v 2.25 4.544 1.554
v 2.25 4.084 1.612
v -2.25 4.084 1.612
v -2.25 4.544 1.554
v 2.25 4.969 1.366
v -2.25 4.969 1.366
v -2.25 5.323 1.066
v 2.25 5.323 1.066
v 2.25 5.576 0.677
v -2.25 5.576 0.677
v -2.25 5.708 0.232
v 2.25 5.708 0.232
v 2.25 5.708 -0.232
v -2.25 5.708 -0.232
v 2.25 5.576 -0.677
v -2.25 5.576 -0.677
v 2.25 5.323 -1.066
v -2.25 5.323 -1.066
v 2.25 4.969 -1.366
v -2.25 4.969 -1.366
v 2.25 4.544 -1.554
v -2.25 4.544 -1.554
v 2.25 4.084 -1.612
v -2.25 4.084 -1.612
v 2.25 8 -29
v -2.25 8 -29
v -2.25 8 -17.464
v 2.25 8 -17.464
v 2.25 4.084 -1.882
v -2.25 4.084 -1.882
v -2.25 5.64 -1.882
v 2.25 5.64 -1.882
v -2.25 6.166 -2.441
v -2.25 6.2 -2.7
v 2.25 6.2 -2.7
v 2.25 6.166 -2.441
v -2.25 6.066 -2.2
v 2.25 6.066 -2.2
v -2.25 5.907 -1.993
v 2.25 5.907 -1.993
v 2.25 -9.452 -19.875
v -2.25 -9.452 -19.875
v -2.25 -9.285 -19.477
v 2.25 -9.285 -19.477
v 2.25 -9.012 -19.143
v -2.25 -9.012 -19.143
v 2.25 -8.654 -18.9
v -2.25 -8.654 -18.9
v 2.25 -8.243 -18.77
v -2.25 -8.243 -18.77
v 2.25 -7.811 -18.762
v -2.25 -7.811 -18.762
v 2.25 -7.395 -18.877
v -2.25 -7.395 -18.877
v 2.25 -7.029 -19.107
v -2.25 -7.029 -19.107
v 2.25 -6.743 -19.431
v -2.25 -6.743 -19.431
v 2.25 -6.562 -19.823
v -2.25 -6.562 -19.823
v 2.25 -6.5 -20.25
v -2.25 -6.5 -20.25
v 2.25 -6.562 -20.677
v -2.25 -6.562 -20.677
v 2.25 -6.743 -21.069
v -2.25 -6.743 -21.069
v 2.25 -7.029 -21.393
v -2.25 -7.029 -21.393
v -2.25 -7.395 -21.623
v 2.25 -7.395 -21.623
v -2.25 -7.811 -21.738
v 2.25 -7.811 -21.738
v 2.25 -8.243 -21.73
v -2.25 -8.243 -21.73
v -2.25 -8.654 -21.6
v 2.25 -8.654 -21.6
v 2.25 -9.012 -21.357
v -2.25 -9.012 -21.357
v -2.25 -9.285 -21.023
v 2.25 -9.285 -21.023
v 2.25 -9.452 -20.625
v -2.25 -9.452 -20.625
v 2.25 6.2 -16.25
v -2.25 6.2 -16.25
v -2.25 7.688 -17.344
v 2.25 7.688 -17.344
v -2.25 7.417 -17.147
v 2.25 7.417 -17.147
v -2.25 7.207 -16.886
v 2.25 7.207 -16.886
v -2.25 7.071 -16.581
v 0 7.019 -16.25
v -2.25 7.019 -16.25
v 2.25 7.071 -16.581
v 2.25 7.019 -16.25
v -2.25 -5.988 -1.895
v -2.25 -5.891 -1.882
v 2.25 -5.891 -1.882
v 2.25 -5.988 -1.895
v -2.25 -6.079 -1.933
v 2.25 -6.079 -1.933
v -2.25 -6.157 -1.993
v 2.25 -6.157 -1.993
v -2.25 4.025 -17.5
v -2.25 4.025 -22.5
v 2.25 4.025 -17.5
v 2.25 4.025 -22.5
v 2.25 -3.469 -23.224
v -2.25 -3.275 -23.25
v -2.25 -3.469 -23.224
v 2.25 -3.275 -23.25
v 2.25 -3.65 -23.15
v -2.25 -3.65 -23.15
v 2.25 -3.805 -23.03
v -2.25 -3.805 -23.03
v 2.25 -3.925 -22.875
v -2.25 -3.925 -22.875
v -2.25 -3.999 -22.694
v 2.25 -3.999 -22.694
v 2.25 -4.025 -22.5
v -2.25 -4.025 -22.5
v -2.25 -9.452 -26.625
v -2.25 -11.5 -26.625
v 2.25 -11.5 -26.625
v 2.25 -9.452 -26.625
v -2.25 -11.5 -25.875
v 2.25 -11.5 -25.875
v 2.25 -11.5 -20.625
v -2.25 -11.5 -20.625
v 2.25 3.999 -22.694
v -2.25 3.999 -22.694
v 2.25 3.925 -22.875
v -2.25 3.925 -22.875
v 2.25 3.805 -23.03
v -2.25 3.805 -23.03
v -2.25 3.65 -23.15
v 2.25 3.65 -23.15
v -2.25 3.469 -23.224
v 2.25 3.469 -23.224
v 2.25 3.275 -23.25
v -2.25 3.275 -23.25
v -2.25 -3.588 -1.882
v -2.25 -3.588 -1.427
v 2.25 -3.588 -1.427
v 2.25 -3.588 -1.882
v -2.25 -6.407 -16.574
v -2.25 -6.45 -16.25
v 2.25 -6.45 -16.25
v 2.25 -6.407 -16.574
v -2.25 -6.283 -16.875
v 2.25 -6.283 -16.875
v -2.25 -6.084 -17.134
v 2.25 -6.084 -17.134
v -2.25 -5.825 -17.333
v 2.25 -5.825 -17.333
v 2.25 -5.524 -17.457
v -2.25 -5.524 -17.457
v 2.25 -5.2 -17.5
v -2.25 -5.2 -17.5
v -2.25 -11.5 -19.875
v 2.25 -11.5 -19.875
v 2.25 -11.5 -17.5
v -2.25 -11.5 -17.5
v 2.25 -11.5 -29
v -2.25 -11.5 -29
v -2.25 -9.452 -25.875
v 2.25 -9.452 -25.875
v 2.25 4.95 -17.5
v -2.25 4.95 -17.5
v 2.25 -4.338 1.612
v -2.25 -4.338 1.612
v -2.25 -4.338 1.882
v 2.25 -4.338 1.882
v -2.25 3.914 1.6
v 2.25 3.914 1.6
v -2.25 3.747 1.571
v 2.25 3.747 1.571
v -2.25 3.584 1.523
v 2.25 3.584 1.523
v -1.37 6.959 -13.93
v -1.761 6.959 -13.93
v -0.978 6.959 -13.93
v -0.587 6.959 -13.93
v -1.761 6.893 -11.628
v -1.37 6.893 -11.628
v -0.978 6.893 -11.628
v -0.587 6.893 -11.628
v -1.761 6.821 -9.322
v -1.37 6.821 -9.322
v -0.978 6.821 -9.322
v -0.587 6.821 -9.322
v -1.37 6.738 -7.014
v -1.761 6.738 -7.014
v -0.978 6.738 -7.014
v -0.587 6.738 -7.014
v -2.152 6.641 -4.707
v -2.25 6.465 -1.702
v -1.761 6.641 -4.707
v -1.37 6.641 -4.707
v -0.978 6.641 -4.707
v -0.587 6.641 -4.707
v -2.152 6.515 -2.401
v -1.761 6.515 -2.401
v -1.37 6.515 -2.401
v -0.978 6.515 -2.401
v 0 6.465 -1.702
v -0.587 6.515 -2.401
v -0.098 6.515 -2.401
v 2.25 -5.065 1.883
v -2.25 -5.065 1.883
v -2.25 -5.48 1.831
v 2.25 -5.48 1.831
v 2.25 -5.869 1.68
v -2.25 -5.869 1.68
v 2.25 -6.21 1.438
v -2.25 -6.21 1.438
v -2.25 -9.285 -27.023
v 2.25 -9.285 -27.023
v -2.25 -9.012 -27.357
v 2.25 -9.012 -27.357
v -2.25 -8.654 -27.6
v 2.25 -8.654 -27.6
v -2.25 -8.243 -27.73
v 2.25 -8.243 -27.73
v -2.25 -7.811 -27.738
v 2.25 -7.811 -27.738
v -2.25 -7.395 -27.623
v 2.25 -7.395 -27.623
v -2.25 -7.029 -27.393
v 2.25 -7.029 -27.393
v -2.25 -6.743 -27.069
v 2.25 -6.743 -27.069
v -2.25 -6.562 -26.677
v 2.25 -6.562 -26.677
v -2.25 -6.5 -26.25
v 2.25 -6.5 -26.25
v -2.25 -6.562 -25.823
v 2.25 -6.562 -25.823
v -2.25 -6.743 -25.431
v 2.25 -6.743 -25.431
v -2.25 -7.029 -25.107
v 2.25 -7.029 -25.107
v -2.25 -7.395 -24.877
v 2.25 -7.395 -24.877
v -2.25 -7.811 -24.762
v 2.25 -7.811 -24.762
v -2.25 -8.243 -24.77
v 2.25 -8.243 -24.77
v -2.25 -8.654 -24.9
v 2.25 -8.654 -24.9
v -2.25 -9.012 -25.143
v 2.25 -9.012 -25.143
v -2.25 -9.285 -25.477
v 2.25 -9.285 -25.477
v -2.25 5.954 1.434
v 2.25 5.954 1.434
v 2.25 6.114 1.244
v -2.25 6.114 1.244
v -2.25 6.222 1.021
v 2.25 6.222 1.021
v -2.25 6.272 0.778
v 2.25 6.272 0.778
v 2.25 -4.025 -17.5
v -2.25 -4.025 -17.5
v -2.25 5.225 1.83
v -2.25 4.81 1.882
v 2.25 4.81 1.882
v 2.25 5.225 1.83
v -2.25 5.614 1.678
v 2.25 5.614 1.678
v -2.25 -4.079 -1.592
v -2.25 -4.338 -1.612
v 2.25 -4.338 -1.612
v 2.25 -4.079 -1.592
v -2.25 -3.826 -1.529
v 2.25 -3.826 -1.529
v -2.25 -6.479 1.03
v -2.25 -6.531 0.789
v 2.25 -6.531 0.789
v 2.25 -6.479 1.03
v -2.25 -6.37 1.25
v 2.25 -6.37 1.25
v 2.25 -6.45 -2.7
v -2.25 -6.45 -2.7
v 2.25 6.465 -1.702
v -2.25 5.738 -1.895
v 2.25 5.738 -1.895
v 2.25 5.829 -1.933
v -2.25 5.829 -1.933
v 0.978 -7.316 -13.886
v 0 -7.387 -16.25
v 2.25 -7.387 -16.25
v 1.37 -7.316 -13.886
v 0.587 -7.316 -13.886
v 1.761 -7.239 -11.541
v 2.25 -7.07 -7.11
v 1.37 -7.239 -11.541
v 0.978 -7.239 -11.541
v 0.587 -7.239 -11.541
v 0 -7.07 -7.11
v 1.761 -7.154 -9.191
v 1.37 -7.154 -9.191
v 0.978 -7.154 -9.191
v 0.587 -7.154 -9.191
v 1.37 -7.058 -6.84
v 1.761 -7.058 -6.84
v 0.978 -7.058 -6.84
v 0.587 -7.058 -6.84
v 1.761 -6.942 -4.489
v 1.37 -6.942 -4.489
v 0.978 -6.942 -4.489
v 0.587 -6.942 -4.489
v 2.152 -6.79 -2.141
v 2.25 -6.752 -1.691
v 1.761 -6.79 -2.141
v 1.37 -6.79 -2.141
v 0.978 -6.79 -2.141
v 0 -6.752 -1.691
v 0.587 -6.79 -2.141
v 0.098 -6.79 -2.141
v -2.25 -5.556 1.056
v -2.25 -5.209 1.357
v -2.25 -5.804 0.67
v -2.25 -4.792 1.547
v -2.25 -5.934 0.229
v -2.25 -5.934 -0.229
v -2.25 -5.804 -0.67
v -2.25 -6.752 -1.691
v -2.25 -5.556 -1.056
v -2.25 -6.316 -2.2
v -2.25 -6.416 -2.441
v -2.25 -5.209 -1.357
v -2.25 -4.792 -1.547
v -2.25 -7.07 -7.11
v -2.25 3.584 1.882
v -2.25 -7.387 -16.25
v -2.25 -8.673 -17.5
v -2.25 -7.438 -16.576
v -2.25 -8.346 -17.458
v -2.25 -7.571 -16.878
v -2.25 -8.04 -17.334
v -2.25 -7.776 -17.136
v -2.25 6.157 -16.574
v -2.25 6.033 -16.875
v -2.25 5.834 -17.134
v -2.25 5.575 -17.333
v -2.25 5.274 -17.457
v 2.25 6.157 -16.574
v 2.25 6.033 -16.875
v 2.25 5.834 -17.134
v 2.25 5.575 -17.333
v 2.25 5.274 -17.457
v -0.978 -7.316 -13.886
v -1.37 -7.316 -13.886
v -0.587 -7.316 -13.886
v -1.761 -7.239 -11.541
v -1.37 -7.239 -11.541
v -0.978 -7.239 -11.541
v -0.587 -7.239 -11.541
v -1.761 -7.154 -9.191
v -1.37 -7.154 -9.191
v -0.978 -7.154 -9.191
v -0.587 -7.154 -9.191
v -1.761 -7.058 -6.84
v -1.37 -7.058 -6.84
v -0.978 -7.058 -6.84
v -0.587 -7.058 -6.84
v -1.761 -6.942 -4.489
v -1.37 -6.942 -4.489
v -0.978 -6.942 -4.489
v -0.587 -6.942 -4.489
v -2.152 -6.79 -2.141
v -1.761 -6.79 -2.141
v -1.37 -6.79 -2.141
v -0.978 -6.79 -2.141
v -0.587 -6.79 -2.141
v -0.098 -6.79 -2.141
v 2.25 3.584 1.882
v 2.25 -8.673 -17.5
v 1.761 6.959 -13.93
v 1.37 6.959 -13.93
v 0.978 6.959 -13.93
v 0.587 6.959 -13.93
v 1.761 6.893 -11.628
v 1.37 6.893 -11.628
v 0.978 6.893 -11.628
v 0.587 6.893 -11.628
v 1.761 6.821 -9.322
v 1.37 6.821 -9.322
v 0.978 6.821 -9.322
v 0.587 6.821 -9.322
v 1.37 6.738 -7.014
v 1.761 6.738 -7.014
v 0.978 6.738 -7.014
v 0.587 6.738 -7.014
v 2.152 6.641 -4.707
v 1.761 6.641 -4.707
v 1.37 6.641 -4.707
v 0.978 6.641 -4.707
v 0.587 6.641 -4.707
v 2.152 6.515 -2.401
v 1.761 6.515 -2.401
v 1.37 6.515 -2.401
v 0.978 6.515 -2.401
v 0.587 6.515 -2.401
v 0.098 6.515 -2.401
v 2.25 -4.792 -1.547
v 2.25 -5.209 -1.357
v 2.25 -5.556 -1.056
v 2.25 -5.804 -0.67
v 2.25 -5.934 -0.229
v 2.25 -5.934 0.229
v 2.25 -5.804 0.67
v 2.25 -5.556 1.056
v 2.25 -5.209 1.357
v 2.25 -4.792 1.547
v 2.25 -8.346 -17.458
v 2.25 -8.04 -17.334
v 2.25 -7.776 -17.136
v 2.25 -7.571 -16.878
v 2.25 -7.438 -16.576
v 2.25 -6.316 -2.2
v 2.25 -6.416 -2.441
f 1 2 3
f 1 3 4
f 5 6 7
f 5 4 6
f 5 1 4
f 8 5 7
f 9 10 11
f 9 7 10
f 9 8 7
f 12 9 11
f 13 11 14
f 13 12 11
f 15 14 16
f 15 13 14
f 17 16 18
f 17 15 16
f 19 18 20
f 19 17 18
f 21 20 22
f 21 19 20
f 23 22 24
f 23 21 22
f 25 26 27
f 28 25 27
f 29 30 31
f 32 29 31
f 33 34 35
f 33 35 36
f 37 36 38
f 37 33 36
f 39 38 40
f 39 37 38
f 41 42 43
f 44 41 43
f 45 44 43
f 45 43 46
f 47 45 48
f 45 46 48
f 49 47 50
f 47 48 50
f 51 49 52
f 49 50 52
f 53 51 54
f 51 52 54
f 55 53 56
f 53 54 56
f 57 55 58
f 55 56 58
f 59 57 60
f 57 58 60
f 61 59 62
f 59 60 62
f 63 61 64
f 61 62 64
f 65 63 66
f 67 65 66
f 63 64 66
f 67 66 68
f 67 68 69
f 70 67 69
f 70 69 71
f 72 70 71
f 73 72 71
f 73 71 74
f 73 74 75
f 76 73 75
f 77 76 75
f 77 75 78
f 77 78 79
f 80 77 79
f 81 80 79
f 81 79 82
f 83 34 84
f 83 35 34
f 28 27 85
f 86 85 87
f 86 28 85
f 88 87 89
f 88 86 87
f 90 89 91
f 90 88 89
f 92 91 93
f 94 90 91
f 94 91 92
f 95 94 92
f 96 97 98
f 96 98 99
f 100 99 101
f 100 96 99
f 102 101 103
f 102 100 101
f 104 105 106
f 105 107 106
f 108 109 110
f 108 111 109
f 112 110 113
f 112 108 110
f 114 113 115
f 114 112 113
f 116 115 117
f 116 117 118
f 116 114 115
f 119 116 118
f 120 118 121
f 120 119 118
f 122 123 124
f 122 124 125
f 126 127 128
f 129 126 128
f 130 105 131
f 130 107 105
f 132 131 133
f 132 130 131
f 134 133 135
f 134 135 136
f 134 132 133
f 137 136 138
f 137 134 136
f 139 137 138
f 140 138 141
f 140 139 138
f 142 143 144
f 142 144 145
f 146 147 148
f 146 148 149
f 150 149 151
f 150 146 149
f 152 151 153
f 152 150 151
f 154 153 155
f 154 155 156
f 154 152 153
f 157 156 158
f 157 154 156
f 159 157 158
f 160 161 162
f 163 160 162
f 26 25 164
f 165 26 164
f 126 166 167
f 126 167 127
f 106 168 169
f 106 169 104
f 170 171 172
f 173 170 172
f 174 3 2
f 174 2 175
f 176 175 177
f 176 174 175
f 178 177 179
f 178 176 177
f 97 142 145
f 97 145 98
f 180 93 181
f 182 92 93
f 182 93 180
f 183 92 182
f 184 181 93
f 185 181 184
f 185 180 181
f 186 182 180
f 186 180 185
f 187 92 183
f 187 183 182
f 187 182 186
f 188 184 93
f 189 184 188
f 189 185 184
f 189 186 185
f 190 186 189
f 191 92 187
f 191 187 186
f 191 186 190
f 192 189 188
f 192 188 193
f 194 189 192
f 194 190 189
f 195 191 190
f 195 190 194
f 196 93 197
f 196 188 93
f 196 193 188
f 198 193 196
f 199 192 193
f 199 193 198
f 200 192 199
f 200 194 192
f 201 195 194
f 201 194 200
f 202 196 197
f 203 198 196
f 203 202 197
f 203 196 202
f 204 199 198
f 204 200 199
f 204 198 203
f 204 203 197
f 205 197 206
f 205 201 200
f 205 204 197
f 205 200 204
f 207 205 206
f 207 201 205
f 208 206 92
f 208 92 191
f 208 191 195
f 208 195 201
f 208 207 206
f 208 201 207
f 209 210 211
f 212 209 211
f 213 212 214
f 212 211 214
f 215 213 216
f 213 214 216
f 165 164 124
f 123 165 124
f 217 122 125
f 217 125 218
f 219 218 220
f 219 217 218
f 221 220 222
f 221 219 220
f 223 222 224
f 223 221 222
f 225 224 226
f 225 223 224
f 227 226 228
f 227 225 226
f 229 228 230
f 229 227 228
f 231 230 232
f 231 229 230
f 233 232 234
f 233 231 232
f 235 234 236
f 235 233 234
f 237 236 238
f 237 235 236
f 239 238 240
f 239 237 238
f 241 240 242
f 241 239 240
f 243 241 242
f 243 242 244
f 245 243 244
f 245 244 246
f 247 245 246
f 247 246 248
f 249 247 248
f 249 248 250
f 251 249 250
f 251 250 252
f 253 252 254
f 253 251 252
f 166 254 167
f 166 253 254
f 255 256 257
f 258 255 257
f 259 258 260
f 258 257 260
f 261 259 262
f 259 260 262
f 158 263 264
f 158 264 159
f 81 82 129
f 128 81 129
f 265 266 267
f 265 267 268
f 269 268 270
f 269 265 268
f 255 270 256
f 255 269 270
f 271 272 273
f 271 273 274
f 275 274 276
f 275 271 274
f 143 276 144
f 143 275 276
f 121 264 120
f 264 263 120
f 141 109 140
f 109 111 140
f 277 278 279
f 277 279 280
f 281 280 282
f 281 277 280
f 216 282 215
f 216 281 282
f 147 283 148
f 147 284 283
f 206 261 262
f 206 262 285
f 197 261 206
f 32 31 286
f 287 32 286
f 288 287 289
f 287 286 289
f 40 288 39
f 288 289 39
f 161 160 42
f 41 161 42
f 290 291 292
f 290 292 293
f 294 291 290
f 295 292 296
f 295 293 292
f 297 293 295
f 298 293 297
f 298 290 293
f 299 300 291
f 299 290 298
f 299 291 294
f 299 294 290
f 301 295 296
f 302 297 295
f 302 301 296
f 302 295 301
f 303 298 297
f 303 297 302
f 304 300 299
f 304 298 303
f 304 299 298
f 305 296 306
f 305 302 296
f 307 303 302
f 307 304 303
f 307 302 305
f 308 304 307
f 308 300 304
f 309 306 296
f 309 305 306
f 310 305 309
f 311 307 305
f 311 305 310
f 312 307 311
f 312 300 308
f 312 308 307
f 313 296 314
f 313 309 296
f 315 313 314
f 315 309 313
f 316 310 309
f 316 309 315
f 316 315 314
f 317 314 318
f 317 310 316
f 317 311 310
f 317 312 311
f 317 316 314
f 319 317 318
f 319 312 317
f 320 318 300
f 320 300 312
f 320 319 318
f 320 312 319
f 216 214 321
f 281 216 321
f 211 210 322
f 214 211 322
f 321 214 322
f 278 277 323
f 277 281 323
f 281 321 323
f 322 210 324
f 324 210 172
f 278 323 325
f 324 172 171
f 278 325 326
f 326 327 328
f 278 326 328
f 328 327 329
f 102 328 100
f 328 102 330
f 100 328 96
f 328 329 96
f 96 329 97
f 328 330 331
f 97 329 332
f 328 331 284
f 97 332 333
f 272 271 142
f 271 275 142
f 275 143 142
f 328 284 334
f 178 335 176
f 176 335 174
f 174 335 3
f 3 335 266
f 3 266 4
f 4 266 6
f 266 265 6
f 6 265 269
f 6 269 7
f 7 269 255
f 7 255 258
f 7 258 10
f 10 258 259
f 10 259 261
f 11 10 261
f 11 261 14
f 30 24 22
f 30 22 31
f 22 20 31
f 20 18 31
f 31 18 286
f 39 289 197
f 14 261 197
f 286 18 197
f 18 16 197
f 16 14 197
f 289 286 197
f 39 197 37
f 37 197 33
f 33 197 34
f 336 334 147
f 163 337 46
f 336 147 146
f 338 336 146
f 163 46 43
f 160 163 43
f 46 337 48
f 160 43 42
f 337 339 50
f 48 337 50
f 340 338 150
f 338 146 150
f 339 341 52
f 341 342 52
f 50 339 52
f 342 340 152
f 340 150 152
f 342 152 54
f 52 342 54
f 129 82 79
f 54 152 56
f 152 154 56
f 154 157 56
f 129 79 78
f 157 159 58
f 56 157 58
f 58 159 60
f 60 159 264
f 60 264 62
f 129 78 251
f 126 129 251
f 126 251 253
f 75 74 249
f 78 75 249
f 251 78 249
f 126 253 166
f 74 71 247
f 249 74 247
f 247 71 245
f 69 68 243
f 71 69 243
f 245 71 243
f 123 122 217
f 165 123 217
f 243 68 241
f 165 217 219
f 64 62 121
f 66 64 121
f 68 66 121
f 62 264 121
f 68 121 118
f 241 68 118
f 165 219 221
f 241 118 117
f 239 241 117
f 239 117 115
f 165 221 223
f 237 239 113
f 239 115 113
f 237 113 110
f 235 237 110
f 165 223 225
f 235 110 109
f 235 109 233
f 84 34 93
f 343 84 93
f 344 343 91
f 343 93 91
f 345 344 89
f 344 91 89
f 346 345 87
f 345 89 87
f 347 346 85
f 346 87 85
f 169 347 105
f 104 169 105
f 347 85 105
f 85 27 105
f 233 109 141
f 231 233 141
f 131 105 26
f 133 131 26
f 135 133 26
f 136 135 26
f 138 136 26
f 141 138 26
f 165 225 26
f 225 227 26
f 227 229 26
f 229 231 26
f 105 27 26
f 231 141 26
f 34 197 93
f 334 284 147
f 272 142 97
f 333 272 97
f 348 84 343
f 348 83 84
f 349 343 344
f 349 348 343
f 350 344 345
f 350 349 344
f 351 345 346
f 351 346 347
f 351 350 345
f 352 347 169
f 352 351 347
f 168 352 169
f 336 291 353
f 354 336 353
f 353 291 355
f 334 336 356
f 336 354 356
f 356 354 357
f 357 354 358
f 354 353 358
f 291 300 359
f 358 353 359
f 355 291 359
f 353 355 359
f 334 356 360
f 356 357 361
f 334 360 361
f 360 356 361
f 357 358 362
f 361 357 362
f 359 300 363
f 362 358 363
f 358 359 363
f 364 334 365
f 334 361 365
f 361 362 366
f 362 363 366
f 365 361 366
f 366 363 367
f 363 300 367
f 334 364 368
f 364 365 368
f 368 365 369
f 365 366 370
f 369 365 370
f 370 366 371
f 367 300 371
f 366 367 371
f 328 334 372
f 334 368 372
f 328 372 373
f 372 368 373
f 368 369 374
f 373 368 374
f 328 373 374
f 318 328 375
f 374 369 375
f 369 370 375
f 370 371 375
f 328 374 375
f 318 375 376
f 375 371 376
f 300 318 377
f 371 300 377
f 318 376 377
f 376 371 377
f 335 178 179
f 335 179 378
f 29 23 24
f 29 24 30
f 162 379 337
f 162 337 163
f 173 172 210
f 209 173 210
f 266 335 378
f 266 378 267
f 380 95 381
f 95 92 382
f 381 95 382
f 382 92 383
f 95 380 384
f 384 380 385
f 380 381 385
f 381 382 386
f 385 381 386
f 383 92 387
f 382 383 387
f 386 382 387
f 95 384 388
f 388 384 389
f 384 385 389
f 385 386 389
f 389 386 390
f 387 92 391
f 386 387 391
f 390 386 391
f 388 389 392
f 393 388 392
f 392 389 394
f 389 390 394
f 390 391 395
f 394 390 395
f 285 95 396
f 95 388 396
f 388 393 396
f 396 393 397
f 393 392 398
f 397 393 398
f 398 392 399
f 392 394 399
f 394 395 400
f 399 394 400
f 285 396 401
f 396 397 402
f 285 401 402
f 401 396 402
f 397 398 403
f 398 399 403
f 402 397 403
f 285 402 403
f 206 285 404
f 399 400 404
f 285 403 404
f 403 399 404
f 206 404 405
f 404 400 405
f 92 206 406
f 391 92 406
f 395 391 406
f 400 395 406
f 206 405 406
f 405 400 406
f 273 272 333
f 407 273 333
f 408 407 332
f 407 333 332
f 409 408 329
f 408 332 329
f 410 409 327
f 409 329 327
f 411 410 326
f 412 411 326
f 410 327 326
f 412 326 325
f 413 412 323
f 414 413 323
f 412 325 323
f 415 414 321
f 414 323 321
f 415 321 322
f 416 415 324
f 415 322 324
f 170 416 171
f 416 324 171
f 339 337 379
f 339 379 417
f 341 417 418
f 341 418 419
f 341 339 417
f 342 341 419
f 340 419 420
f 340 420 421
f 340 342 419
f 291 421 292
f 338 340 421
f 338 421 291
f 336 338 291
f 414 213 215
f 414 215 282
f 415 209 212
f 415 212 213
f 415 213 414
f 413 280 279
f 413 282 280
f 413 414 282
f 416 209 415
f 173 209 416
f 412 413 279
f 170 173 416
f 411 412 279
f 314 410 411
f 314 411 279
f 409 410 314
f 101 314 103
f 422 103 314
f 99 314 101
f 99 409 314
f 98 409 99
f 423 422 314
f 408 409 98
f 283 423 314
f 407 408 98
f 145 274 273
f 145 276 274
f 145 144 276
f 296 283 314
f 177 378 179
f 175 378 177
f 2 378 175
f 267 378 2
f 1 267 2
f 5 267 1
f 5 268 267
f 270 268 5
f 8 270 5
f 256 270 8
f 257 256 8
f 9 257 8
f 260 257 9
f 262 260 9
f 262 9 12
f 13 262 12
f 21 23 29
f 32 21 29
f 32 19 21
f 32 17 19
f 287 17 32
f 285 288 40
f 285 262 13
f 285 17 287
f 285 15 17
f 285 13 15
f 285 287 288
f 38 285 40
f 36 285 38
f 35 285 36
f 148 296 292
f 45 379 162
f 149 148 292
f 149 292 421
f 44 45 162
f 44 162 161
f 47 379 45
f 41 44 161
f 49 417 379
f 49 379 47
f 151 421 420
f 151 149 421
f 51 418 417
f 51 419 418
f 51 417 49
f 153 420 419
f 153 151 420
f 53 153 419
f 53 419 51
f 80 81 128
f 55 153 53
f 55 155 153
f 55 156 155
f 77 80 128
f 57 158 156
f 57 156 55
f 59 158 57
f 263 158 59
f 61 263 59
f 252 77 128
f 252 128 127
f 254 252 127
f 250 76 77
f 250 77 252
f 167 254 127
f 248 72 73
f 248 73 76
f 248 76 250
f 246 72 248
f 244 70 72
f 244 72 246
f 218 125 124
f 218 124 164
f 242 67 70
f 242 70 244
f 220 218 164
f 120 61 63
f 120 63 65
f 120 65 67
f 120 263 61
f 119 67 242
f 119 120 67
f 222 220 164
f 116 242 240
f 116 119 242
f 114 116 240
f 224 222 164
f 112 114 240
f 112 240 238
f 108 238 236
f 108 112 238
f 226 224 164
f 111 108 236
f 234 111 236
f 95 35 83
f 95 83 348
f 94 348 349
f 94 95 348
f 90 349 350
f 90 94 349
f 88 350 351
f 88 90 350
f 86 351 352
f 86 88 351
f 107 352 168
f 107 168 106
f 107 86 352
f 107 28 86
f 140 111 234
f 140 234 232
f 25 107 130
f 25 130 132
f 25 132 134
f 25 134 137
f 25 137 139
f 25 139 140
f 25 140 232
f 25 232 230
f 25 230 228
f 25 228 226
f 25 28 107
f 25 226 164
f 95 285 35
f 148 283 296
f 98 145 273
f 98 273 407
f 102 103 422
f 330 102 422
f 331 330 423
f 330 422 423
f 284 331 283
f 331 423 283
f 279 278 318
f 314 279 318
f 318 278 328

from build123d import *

# Parameters (mm, degrees)
BOSS_EXTRUDE1_DEPTH = 2.25
CUT_EXTRUDE1_DEPTH  = 32.519835025
FILLET1_R           = 0.75
BOSS_EXTRUDE2_DEPTH = 2.25
BOSS_EXTRUDE4_DEPTH = 4.5
FILLET2_R           = 1
CUT_EXTRUDE4_DEPTH  = 5
BOSS_EXTRUDE5_START = -2.25
BOSS_EXTRUDE5_DEPTH = 4.5
SKETCH12_W          = 11.535913892
SKETCH12_H          = 0.5
CUT_EXTRUDE5_DEPTH  = 32.519835168


with BuildPart() as part:
    # Sketch1 → Boss-Extrude1 (new, symmetric)
    with BuildSketch(Plane(origin=(0, 0, 0), x_dir=(0, 0, -1), z_dir=(1, 0, 0))):
        Polygon((17.5, 4.025), (17.5, 4.95), (17.5, 8.301357795), (17.5, 8.5), (29, 8.5), (29, -11.5), (17.5, -11.5), (17.5, -8.673247977), (17.5, -5.2), (17.5, -4.025), (23.25, -4.025), (23.25, 4.025), align=None)
    extrude(amount=BOSS_EXTRUDE1_DEPTH, both=True)

    # Sketch4 → Cut-Extrude1 (cut, through all)
    with BuildSketch(Plane.ZY.offset(2.25)):
        with BuildLine():
            Line((-26.625, -11.5), (-26.625, -9.452368755))
            ThreePointArc((-26.625, -9.452368755), (-26.25, -6.5), (-25.875, -9.452368755))
            Line((-25.875, -9.452368755), (-25.875, -11.5))
            Line((-25.875, -11.5), (-26.625, -11.5))
        make_face()
        with BuildLine():
            Line((-20.625, -9.452368755), (-20.625, -11.5))
            Line((-20.625, -11.5), (-19.875, -11.5))
            Line((-19.875, -11.5), (-19.875, -9.452368755))
            ThreePointArc((-19.875, -9.452368755), (-20.25, -6.5), (-20.625, -9.452368755))
        make_face()
    extrude(amount=-CUT_EXTRUDE1_DEPTH, mode=Mode.SUBTRACT)

    # Fillet1
    fillet1_edges = [part.edges().sort_by_distance(p)[0] for p in [
        (0, -4.025, -23.25),
        (0, 4.025, -23.25),
    ]]
    fillet(fillet1_edges, radius=FILLET1_R)

    # Sketch2 → Boss-Extrude2 (add, symmetric)
    with BuildSketch(Plane(origin=(0, 0, 0), x_dir=(0, 0, -1), z_dir=(1, 0, 0))):
        with BuildLine():
            Line((1.7, -6.45), (16.25, -6.45))
            ThreePointArc((16.25, -6.45), (17.133883476, -6.083883476), (17.5, -5.2))
            Line((17.5, -5.2), (17.5, -8.673247977))
            ThreePointArc((17.5, -8.673247977), (17.136039688, -7.776350438), (16.25, -7.38670191))
            add(Edge.make_bspline(
                [(16.25, -7.38670191), (15.982544989, -7.378993429), (15.453928293, -7.363553213), (14.397933299, -7.332164796), (13.361703255, -7.29957206), (12.100876768, -7.258861503), (10.975898138, -7.220164867), (9.768608213, -7.176905715), (8.611498431, -7.132461764), (7.424019565, -7.084024767), (6.255327605, -7.032148986), (5.075409432, -6.975000615), (3.903033551, -6.911058587), (2.727587922, -6.837381628), (1.722719604, -6.759660724), (0.954287884, -6.683217964), (0.456400256, -6.610639739), (0.237084283, -6.56505431), (0.137087499, -6.537027737), (0.087321771, -6.519206998), (0.060111975, -6.507310883), (0.043000809, -6.498417374), (0.030678751, -6.490921905), (0.01600081, -6.480451435), (0.005229873, -6.469720378), (0.000815287, -6.459042222), (0, -6.45)],
                knots=[0.090617463, 0.090617463, 0.090617463, 0.090617463, 0.090617463, 0.156221583, 0.221825702, 0.287429821, 0.35303394, 0.41863806, 0.484242179, 0.549846298, 0.615450417, 0.681054537, 0.746658656, 0.812262775, 0.877866892, 0.943220604, 0.971682344, 0.984222879, 0.990100446, 0.993094331, 0.994839978, 0.995992112, 0.996718592, 0.997392575, 0.998059613, 1, 1, 1, 1, 1], degree=4))
            Line((0, -6.45), (-1.7, -6.45))
            Line((-1.7, -6.45), (-1.7, -4.45))
            ThreePointArc((-1.7, -4.45), (0, -2.75), (1.7, -4.45))
            Line((1.7, -4.45), (1.7, -6.45))
        make_face()
        with BuildLine():
            Line((17.5, 4.95), (17.5, 8.301357795))
            ThreePointArc((17.5, 8.301357795), (17.135773003, 7.406119792), (16.25, 7.019443472))
            add(Edge.make_bspline(
                [(16.25, 7.019443472), (15.987531738, 7.01282569), (15.470119802, 6.999607493), (14.430987801, 6.972604073), (13.4161389, 6.944724509), (12.177418763, 6.909818433), (11.074067802, 6.876745116), (9.888671574, 6.839769393), (8.753245319, 6.801895235), (7.587539532, 6.760659557), (6.440473735, 6.716696676), (5.282208442, 6.668364938), (4.131254265, 6.614778963), (2.976099529, 6.553298089), (1.935166314, 6.486657721), (1.112090632, 6.419330464), (0.550531612, 6.355136747), (0.26288649, 6.306396396), (0.144856484, 6.278329018), (0.090076692, 6.261554801), (0.061106748, 6.250555216), (0.043474041, 6.242594857), (0.030984848, 6.235965644), (0.016604026, 6.227042793), (0.005627844, 6.21781856), (0.000998515, 6.208209958), (0, 6.2)],
                knots=[0.090678734, 0.090678734, 0.090678734, 0.090678734, 0.090678734, 0.15510723, 0.219535726, 0.283964222, 0.348392717, 0.412821213, 0.477249709, 0.541678205, 0.606106701, 0.670535197, 0.734963692, 0.799392188, 0.863820683, 0.928249179, 0.967999033, 0.983460374, 0.990010293, 0.993269409, 0.995072657, 0.996228288, 0.996922821, 0.997582549, 0.998234329, 1, 1, 1, 1, 1], degree=4))
            Line((0, 6.2), (-1.7, 6.2))
            Line((-1.7, 6.2), (-1.7, 4.2))
            ThreePointArc((-1.7, 4.2), (0, 2.5), (1.7, 4.2))
            Line((1.7, 4.2), (1.7, 6.2))
            Line((1.7, 6.2), (16.25, 6.2))
            ThreePointArc((16.25, 6.2), (17.133883476, 5.833883476), (17.5, 4.95))
        make_face()
    extrude(amount=BOSS_EXTRUDE2_DEPTH, both=True)

    # Sketch3 → Boss-Extrude4 (add, through all)
    with BuildSketch(Plane.ZY.offset(2.25)):
        with BuildLine():
            Line((1.7, -6.45), (-1.690848844, -6.752163217))
            add(Edge.make_bspline(
                [(0, -6.45), (-0.000815287, -6.459042222), (-0.005229873, -6.469720378), (-0.01600081, -6.480451435), (-0.030678751, -6.490921905), (-0.043000809, -6.498417374), (-0.060111975, -6.507310883), (-0.087321771, -6.519206998), (-0.137087499, -6.537027737), (-0.237084283, -6.56505431), (-0.456400256, -6.610639739), (-0.842629924, -6.666941327), (-1.204799072, -6.706915262), (-1.511345405, -6.736167418), (-1.690848844, -6.752163217)],
                knots=[0.090617463, 0.090617463, 0.090617463, 0.090617463, 0.090617463, 0.09255785, 0.093224888, 0.093898872, 0.094625351, 0.095777486, 0.097523132, 0.100517018, 0.106394584, 0.118935119, 0.14739686, 0.187580696, 0.187580696, 0.187580696, 0.187580696, 0.187580696], degree=4))
            Line((0, -6.45), (1.7, -6.45))
        make_face()
        with BuildLine():
            Line((0, 6.2), (1.7, 6.2))
            Line((1.7, 6.2), (-1.70169721, 6.465184862))
            add(Edge.make_bspline(
                [(-1.70169721, 6.465184862), (-1.588493346, 6.45635987), (-1.29771245, 6.43266583), (-0.938114175, 6.399442625), (-0.550531612, 6.355136747), (-0.26288649, 6.306396396), (-0.144856484, 6.278329018), (-0.090076692, 6.261554801), (-0.061106748, 6.250555216), (-0.043474041, 6.242594857), (-0.030984848, 6.235965644), (-0.016604026, 6.227042793), (-0.005627844, 6.21781856), (-0.000998515, 6.208209958), (0, 6.2)],
                knots=[0.902915454, 0.902915454, 0.902915454, 0.902915454, 0.902915454, 0.928249179, 0.967999033, 0.983460374, 0.990010293, 0.993269409, 0.995072657, 0.996228288, 0.996922821, 0.997582549, 0.998234329, 1, 1, 1, 1, 1], degree=4))
        make_face()
    extrude(amount=-BOSS_EXTRUDE4_DEPTH)

    # Fillet2
    fillet2_edges = [part.edges().sort_by_distance(p)[0] for p in [
        (0, -6.45, -1.7),
        (0, -6.45, 1.7),
        (0, 6.2, 1.7),
        (0, 6.2, -1.7),
    ]]
    fillet(fillet2_edges, radius=FILLET2_R)

    # Sketch6 → Cut-Extrude4 (cut, symmetric)
    with BuildSketch(Plane(origin=(0, 0, 0), x_dir=(0, 0, -1), z_dir=(1, 0, 0))):
        with BuildLine():
            Line((-1.6125, -4.3375), (-1.696273489, -4.3375))
            Line((-1.696273489, -4.3375), (-1.696273489, -2.65))
            Line((-1.696273489, -2.65), (1.696273489, -2.65))
            Line((1.696273489, -2.65), (1.696273489, -4.3375))
            Line((1.696273489, -4.3375), (1.6125, -4.3375))
            ThreePointArc((1.6125, -4.3375), (0, -5.95), (-1.6125, -4.3375))
        make_face()
        with BuildLine():
            Line((1.612242467, 4.083682007), (1.696015956, 4.083682007))
            Line((1.696015956, 4.083682007), (1.696015956, 2.396182007))
            Line((1.696015956, 2.396182007), (-1.696015956, 2.396182007))
            Line((-1.696015956, 2.396182007), (-1.696015956, 4.083682007))
            Line((-1.696015956, 4.083682007), (-1.612242467, 4.083682007))
            ThreePointArc((-1.612242467, 4.083682007), (0, 5.725), (1.612242467, 4.083682007))
        make_face()
    extrude(amount=CUT_EXTRUDE4_DEPTH, both=True, mode=Mode.SUBTRACT)

    # Sketch9 → Boss-Extrude5 (add)
    with BuildSketch(Plane(origin=(0, 0, 0), x_dir=(0, 0, -1), z_dir=(1, 0, 0)).offset(BOSS_EXTRUDE5_START)):
        with BuildLine():
            Line((-1.696273489, -4.3375), (-1.8825, -4.3375))
            Line((-1.8825, -4.3375), (-1.8825, -5.065291012))
            ThreePointArc((-1.8825, -5.065291012), (-1.767426598, -5.679381925), (-1.437821002, -6.210145232))
            ThreePointArc((-1.437821002, -6.210145232), (-1.63215369, -5.89721165), (-1.7, -5.535148811))
            Line((-1.7, -5.535148811), (-1.7, -4.45))
            ThreePointArc((-1.7, -4.45), (-1.699068117, -4.393719149), (-1.696273489, -4.3375))
        make_face()
        with BuildLine():
            Line((1.8825, -4.3375), (1.8825, -5.890593975))
            ThreePointArc((1.8825, -5.890593975), (1.911190263, -6.034829666), (1.992893219, -6.157106781))
            ThreePointArc((1.992893219, -6.157106781), (1.776120467, -5.832683432), (1.7, -5.45))
            Line((1.7, -5.45), (1.7, -4.45))
            ThreePointArc((1.7, -4.45), (1.699068117, -4.393719149), (1.696273489, -4.3375))
            Line((1.696273489, -4.3375), (1.6125, -4.3375))
            ThreePointArc((1.6125, -4.3375), (1.565557971, -3.951255919), (1.427464973, -3.5875))
            Line((1.427464973, -3.5875), (1.8825, -3.5875))
            Line((1.8825, -3.5875), (1.8825, -4.3375))
        make_face()
        with BuildLine():
            Line((1.696015956, 4.083682007), (1.882242467, 4.083682007))
            Line((1.882242467, 4.083682007), (1.882242467, 5.639972236))
            ThreePointArc((1.882242467, 5.639972236), (1.910999661, 5.78454441), (1.992893219, 5.907106781))
            ThreePointArc((1.992893219, 5.907106781), (1.776120467, 5.582683432), (1.7, 5.2))
            Line((1.7, 5.2), (1.7, 4.2))
            ThreePointArc((1.7, 4.2), (1.699003697, 4.141806899), (1.696015956, 4.083682007))
        make_face()
        with BuildLine():
            Line((-1.882242467, 4.083682007), (-1.882242467, 4.809550575))
            ThreePointArc((-1.882242467, 4.809550575), (-1.766204889, 5.424085171), (-1.434071123, 5.95399521))
            ThreePointArc((-1.434071123, 5.95399521), (-1.631147443, 5.639565509), (-1.7, 5.274922618))
            Line((-1.7, 5.274922618), (-1.7, 4.2))
            ThreePointArc((-1.7, 4.2), (-1.699003697, 4.141806899), (-1.696015956, 4.083682007))
            Line((-1.696015956, 4.083682007), (-1.612242467, 4.083682007))
            ThreePointArc((-1.612242467, 4.083682007), (-1.587589378, 3.830159396), (-1.523321299, 3.583682007))
            Line((-1.523321299, 3.583682007), (-1.882242467, 3.583682007))
            Line((-1.882242467, 3.583682007), (-1.882242467, 4.083682007))
        make_face()
    extrude(amount=BOSS_EXTRUDE5_DEPTH)

    # Sketch12 → Cut-Extrude5 (cut, through all)
    with BuildSketch(Plane.ZY.offset(2.25)):
        with Locations((-23.232043054, 8.25)):
            Rectangle(SKETCH12_W, SKETCH12_H)
    extrude(amount=-CUT_EXTRUDE5_DEPTH, mode=Mode.SUBTRACT)


solid = part.part
